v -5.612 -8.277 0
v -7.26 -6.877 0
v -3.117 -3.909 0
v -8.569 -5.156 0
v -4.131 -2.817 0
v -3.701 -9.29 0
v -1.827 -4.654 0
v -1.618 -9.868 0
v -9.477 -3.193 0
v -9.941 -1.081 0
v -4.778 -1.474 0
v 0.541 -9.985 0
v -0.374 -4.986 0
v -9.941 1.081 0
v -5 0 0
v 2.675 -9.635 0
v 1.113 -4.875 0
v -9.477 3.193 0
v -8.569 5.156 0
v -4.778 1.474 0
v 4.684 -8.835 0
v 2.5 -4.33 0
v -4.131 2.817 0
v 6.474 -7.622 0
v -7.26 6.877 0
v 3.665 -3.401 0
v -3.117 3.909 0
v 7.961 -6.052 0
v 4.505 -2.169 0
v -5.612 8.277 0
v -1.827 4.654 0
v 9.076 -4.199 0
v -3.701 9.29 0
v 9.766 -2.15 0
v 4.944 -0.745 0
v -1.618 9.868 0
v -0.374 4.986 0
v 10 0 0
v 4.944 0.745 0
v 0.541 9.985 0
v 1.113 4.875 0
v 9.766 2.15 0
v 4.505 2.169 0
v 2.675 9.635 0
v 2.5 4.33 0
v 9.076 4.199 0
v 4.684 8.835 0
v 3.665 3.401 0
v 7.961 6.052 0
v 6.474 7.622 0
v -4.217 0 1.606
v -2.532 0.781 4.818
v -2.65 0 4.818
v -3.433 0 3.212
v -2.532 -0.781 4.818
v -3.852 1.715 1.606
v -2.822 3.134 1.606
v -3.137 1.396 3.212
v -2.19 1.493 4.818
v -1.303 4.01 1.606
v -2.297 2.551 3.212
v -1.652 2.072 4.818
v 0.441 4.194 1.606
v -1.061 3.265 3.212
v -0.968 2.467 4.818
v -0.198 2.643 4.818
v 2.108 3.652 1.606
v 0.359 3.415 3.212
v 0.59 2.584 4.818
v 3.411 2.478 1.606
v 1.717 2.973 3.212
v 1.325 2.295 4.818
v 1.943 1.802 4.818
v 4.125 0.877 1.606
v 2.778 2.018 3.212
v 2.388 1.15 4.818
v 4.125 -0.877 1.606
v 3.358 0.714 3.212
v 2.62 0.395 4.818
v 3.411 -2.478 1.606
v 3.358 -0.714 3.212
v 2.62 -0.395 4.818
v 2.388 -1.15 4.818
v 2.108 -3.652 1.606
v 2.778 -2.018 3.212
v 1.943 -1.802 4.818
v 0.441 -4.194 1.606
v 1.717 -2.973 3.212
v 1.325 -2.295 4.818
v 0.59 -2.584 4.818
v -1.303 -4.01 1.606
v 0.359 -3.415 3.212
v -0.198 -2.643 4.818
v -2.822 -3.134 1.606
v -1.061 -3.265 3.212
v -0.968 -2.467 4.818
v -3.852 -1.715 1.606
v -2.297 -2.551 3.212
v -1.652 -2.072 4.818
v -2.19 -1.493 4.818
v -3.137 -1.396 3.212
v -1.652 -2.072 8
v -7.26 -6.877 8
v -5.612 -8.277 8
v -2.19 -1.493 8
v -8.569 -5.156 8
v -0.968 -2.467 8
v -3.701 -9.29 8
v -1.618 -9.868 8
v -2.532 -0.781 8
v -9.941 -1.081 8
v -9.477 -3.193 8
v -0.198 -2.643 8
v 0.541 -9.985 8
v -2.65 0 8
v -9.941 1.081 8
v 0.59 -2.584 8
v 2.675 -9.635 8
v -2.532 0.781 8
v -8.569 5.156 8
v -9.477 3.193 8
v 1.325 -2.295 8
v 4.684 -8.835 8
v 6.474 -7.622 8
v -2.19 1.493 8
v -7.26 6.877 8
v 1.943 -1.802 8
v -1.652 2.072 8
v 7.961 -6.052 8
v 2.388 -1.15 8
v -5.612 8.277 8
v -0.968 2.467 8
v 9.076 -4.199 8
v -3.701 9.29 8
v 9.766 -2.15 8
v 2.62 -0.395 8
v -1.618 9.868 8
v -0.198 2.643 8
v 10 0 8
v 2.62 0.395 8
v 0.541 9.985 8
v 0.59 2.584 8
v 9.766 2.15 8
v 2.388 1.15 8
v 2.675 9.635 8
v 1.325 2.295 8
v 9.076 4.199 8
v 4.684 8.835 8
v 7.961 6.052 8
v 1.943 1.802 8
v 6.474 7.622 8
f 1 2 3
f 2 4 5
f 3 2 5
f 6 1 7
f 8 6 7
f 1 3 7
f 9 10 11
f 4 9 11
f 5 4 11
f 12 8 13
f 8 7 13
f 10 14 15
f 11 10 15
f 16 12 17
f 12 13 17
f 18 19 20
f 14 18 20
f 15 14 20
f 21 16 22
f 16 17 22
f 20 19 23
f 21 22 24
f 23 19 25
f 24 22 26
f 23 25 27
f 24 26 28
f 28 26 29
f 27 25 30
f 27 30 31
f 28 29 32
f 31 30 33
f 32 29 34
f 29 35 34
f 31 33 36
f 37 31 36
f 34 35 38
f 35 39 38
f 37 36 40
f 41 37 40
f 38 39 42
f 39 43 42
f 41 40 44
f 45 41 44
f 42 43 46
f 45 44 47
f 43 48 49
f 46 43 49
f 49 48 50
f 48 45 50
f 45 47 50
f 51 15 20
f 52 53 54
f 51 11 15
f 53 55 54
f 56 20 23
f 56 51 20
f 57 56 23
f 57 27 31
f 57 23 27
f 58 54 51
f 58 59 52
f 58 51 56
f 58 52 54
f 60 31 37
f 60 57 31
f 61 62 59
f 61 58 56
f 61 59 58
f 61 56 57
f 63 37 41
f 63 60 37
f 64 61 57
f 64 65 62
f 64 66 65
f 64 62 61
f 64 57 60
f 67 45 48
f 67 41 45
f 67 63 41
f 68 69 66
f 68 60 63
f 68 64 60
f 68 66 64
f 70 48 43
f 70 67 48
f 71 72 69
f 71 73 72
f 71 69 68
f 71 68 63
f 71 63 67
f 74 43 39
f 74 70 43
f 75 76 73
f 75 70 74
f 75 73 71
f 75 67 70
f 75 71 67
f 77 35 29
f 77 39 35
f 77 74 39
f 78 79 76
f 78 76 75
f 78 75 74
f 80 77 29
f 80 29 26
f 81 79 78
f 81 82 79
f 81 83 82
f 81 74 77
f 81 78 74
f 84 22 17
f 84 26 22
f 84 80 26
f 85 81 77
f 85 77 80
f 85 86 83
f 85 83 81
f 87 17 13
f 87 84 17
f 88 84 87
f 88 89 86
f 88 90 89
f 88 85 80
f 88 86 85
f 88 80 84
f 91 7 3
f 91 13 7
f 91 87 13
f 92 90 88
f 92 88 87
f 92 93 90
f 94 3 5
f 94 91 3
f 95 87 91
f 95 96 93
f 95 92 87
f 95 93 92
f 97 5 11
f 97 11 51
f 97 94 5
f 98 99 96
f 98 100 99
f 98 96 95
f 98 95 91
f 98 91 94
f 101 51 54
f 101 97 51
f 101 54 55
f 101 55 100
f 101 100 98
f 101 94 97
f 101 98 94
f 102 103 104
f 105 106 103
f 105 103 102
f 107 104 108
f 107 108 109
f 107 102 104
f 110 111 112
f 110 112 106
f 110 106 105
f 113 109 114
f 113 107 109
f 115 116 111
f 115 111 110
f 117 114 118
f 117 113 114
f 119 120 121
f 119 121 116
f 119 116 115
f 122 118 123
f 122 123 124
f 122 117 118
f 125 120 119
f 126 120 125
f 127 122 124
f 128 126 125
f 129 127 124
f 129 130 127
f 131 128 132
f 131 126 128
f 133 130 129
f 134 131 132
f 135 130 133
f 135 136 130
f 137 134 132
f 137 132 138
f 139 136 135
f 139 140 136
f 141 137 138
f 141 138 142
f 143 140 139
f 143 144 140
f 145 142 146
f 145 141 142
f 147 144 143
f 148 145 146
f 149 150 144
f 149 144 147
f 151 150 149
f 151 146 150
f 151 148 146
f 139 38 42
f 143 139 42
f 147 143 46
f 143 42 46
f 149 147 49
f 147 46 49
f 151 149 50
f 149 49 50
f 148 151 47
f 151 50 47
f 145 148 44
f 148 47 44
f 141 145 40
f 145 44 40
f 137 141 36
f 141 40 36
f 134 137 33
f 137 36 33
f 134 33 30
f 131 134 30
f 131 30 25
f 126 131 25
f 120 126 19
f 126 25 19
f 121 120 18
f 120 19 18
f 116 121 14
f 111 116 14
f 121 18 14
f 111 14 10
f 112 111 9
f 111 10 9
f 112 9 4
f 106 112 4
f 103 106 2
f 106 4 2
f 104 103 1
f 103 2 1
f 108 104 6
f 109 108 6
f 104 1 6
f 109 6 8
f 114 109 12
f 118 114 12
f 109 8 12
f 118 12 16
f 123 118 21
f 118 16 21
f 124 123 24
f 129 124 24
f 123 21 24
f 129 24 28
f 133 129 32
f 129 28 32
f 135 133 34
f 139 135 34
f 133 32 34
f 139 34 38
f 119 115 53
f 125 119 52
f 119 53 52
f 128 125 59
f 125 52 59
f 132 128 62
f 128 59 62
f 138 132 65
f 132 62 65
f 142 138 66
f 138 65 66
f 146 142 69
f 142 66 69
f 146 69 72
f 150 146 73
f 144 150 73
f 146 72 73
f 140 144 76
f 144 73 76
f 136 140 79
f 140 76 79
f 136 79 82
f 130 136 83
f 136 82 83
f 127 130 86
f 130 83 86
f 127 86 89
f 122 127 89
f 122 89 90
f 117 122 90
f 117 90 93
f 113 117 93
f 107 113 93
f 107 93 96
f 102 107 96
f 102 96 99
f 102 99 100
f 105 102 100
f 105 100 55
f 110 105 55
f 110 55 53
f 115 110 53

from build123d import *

# Parameters (mm, degrees)
SKETCH1_R           = 10
BOSS_EXTRUDE1_DEPTH = 8
SKETCH2_R           = 2.65
CUT_EXTRUDE1_DEPTH  = 8
SKETCH3_R           = 5
CUT_EXTRUDE2_DEPTH  = 5
CUT_EXTRUDE2_TAPER  = 26


with BuildPart() as part:
    # Sketch1 → Boss-Extrude1 (new body)
    with BuildSketch(Plane.XY):
        Circle(SKETCH1_R)
    extrude(amount=BOSS_EXTRUDE1_DEPTH)

    # Sketch2 → Cut-Extrude1 (cut)
    with BuildSketch(Plane(origin=(0, 0, 0), x_dir=(-1, 0, 0), z_dir=(0, 0, -1))):
        Circle(SKETCH2_R)
    extrude(amount=-CUT_EXTRUDE1_DEPTH, mode=Mode.SUBTRACT)

    # Sketch3 → Cut-Extrude2 (cut)
    with BuildSketch(Plane(origin=(0, 0, 0), x_dir=(-1, 0, 0), z_dir=(0, 0, -1))):
        Circle(SKETCH3_R)
    extrude(amount=-CUT_EXTRUDE2_DEPTH, taper=CUT_EXTRUDE2_TAPER, mode=Mode.SUBTRACT)


solid = part.part
